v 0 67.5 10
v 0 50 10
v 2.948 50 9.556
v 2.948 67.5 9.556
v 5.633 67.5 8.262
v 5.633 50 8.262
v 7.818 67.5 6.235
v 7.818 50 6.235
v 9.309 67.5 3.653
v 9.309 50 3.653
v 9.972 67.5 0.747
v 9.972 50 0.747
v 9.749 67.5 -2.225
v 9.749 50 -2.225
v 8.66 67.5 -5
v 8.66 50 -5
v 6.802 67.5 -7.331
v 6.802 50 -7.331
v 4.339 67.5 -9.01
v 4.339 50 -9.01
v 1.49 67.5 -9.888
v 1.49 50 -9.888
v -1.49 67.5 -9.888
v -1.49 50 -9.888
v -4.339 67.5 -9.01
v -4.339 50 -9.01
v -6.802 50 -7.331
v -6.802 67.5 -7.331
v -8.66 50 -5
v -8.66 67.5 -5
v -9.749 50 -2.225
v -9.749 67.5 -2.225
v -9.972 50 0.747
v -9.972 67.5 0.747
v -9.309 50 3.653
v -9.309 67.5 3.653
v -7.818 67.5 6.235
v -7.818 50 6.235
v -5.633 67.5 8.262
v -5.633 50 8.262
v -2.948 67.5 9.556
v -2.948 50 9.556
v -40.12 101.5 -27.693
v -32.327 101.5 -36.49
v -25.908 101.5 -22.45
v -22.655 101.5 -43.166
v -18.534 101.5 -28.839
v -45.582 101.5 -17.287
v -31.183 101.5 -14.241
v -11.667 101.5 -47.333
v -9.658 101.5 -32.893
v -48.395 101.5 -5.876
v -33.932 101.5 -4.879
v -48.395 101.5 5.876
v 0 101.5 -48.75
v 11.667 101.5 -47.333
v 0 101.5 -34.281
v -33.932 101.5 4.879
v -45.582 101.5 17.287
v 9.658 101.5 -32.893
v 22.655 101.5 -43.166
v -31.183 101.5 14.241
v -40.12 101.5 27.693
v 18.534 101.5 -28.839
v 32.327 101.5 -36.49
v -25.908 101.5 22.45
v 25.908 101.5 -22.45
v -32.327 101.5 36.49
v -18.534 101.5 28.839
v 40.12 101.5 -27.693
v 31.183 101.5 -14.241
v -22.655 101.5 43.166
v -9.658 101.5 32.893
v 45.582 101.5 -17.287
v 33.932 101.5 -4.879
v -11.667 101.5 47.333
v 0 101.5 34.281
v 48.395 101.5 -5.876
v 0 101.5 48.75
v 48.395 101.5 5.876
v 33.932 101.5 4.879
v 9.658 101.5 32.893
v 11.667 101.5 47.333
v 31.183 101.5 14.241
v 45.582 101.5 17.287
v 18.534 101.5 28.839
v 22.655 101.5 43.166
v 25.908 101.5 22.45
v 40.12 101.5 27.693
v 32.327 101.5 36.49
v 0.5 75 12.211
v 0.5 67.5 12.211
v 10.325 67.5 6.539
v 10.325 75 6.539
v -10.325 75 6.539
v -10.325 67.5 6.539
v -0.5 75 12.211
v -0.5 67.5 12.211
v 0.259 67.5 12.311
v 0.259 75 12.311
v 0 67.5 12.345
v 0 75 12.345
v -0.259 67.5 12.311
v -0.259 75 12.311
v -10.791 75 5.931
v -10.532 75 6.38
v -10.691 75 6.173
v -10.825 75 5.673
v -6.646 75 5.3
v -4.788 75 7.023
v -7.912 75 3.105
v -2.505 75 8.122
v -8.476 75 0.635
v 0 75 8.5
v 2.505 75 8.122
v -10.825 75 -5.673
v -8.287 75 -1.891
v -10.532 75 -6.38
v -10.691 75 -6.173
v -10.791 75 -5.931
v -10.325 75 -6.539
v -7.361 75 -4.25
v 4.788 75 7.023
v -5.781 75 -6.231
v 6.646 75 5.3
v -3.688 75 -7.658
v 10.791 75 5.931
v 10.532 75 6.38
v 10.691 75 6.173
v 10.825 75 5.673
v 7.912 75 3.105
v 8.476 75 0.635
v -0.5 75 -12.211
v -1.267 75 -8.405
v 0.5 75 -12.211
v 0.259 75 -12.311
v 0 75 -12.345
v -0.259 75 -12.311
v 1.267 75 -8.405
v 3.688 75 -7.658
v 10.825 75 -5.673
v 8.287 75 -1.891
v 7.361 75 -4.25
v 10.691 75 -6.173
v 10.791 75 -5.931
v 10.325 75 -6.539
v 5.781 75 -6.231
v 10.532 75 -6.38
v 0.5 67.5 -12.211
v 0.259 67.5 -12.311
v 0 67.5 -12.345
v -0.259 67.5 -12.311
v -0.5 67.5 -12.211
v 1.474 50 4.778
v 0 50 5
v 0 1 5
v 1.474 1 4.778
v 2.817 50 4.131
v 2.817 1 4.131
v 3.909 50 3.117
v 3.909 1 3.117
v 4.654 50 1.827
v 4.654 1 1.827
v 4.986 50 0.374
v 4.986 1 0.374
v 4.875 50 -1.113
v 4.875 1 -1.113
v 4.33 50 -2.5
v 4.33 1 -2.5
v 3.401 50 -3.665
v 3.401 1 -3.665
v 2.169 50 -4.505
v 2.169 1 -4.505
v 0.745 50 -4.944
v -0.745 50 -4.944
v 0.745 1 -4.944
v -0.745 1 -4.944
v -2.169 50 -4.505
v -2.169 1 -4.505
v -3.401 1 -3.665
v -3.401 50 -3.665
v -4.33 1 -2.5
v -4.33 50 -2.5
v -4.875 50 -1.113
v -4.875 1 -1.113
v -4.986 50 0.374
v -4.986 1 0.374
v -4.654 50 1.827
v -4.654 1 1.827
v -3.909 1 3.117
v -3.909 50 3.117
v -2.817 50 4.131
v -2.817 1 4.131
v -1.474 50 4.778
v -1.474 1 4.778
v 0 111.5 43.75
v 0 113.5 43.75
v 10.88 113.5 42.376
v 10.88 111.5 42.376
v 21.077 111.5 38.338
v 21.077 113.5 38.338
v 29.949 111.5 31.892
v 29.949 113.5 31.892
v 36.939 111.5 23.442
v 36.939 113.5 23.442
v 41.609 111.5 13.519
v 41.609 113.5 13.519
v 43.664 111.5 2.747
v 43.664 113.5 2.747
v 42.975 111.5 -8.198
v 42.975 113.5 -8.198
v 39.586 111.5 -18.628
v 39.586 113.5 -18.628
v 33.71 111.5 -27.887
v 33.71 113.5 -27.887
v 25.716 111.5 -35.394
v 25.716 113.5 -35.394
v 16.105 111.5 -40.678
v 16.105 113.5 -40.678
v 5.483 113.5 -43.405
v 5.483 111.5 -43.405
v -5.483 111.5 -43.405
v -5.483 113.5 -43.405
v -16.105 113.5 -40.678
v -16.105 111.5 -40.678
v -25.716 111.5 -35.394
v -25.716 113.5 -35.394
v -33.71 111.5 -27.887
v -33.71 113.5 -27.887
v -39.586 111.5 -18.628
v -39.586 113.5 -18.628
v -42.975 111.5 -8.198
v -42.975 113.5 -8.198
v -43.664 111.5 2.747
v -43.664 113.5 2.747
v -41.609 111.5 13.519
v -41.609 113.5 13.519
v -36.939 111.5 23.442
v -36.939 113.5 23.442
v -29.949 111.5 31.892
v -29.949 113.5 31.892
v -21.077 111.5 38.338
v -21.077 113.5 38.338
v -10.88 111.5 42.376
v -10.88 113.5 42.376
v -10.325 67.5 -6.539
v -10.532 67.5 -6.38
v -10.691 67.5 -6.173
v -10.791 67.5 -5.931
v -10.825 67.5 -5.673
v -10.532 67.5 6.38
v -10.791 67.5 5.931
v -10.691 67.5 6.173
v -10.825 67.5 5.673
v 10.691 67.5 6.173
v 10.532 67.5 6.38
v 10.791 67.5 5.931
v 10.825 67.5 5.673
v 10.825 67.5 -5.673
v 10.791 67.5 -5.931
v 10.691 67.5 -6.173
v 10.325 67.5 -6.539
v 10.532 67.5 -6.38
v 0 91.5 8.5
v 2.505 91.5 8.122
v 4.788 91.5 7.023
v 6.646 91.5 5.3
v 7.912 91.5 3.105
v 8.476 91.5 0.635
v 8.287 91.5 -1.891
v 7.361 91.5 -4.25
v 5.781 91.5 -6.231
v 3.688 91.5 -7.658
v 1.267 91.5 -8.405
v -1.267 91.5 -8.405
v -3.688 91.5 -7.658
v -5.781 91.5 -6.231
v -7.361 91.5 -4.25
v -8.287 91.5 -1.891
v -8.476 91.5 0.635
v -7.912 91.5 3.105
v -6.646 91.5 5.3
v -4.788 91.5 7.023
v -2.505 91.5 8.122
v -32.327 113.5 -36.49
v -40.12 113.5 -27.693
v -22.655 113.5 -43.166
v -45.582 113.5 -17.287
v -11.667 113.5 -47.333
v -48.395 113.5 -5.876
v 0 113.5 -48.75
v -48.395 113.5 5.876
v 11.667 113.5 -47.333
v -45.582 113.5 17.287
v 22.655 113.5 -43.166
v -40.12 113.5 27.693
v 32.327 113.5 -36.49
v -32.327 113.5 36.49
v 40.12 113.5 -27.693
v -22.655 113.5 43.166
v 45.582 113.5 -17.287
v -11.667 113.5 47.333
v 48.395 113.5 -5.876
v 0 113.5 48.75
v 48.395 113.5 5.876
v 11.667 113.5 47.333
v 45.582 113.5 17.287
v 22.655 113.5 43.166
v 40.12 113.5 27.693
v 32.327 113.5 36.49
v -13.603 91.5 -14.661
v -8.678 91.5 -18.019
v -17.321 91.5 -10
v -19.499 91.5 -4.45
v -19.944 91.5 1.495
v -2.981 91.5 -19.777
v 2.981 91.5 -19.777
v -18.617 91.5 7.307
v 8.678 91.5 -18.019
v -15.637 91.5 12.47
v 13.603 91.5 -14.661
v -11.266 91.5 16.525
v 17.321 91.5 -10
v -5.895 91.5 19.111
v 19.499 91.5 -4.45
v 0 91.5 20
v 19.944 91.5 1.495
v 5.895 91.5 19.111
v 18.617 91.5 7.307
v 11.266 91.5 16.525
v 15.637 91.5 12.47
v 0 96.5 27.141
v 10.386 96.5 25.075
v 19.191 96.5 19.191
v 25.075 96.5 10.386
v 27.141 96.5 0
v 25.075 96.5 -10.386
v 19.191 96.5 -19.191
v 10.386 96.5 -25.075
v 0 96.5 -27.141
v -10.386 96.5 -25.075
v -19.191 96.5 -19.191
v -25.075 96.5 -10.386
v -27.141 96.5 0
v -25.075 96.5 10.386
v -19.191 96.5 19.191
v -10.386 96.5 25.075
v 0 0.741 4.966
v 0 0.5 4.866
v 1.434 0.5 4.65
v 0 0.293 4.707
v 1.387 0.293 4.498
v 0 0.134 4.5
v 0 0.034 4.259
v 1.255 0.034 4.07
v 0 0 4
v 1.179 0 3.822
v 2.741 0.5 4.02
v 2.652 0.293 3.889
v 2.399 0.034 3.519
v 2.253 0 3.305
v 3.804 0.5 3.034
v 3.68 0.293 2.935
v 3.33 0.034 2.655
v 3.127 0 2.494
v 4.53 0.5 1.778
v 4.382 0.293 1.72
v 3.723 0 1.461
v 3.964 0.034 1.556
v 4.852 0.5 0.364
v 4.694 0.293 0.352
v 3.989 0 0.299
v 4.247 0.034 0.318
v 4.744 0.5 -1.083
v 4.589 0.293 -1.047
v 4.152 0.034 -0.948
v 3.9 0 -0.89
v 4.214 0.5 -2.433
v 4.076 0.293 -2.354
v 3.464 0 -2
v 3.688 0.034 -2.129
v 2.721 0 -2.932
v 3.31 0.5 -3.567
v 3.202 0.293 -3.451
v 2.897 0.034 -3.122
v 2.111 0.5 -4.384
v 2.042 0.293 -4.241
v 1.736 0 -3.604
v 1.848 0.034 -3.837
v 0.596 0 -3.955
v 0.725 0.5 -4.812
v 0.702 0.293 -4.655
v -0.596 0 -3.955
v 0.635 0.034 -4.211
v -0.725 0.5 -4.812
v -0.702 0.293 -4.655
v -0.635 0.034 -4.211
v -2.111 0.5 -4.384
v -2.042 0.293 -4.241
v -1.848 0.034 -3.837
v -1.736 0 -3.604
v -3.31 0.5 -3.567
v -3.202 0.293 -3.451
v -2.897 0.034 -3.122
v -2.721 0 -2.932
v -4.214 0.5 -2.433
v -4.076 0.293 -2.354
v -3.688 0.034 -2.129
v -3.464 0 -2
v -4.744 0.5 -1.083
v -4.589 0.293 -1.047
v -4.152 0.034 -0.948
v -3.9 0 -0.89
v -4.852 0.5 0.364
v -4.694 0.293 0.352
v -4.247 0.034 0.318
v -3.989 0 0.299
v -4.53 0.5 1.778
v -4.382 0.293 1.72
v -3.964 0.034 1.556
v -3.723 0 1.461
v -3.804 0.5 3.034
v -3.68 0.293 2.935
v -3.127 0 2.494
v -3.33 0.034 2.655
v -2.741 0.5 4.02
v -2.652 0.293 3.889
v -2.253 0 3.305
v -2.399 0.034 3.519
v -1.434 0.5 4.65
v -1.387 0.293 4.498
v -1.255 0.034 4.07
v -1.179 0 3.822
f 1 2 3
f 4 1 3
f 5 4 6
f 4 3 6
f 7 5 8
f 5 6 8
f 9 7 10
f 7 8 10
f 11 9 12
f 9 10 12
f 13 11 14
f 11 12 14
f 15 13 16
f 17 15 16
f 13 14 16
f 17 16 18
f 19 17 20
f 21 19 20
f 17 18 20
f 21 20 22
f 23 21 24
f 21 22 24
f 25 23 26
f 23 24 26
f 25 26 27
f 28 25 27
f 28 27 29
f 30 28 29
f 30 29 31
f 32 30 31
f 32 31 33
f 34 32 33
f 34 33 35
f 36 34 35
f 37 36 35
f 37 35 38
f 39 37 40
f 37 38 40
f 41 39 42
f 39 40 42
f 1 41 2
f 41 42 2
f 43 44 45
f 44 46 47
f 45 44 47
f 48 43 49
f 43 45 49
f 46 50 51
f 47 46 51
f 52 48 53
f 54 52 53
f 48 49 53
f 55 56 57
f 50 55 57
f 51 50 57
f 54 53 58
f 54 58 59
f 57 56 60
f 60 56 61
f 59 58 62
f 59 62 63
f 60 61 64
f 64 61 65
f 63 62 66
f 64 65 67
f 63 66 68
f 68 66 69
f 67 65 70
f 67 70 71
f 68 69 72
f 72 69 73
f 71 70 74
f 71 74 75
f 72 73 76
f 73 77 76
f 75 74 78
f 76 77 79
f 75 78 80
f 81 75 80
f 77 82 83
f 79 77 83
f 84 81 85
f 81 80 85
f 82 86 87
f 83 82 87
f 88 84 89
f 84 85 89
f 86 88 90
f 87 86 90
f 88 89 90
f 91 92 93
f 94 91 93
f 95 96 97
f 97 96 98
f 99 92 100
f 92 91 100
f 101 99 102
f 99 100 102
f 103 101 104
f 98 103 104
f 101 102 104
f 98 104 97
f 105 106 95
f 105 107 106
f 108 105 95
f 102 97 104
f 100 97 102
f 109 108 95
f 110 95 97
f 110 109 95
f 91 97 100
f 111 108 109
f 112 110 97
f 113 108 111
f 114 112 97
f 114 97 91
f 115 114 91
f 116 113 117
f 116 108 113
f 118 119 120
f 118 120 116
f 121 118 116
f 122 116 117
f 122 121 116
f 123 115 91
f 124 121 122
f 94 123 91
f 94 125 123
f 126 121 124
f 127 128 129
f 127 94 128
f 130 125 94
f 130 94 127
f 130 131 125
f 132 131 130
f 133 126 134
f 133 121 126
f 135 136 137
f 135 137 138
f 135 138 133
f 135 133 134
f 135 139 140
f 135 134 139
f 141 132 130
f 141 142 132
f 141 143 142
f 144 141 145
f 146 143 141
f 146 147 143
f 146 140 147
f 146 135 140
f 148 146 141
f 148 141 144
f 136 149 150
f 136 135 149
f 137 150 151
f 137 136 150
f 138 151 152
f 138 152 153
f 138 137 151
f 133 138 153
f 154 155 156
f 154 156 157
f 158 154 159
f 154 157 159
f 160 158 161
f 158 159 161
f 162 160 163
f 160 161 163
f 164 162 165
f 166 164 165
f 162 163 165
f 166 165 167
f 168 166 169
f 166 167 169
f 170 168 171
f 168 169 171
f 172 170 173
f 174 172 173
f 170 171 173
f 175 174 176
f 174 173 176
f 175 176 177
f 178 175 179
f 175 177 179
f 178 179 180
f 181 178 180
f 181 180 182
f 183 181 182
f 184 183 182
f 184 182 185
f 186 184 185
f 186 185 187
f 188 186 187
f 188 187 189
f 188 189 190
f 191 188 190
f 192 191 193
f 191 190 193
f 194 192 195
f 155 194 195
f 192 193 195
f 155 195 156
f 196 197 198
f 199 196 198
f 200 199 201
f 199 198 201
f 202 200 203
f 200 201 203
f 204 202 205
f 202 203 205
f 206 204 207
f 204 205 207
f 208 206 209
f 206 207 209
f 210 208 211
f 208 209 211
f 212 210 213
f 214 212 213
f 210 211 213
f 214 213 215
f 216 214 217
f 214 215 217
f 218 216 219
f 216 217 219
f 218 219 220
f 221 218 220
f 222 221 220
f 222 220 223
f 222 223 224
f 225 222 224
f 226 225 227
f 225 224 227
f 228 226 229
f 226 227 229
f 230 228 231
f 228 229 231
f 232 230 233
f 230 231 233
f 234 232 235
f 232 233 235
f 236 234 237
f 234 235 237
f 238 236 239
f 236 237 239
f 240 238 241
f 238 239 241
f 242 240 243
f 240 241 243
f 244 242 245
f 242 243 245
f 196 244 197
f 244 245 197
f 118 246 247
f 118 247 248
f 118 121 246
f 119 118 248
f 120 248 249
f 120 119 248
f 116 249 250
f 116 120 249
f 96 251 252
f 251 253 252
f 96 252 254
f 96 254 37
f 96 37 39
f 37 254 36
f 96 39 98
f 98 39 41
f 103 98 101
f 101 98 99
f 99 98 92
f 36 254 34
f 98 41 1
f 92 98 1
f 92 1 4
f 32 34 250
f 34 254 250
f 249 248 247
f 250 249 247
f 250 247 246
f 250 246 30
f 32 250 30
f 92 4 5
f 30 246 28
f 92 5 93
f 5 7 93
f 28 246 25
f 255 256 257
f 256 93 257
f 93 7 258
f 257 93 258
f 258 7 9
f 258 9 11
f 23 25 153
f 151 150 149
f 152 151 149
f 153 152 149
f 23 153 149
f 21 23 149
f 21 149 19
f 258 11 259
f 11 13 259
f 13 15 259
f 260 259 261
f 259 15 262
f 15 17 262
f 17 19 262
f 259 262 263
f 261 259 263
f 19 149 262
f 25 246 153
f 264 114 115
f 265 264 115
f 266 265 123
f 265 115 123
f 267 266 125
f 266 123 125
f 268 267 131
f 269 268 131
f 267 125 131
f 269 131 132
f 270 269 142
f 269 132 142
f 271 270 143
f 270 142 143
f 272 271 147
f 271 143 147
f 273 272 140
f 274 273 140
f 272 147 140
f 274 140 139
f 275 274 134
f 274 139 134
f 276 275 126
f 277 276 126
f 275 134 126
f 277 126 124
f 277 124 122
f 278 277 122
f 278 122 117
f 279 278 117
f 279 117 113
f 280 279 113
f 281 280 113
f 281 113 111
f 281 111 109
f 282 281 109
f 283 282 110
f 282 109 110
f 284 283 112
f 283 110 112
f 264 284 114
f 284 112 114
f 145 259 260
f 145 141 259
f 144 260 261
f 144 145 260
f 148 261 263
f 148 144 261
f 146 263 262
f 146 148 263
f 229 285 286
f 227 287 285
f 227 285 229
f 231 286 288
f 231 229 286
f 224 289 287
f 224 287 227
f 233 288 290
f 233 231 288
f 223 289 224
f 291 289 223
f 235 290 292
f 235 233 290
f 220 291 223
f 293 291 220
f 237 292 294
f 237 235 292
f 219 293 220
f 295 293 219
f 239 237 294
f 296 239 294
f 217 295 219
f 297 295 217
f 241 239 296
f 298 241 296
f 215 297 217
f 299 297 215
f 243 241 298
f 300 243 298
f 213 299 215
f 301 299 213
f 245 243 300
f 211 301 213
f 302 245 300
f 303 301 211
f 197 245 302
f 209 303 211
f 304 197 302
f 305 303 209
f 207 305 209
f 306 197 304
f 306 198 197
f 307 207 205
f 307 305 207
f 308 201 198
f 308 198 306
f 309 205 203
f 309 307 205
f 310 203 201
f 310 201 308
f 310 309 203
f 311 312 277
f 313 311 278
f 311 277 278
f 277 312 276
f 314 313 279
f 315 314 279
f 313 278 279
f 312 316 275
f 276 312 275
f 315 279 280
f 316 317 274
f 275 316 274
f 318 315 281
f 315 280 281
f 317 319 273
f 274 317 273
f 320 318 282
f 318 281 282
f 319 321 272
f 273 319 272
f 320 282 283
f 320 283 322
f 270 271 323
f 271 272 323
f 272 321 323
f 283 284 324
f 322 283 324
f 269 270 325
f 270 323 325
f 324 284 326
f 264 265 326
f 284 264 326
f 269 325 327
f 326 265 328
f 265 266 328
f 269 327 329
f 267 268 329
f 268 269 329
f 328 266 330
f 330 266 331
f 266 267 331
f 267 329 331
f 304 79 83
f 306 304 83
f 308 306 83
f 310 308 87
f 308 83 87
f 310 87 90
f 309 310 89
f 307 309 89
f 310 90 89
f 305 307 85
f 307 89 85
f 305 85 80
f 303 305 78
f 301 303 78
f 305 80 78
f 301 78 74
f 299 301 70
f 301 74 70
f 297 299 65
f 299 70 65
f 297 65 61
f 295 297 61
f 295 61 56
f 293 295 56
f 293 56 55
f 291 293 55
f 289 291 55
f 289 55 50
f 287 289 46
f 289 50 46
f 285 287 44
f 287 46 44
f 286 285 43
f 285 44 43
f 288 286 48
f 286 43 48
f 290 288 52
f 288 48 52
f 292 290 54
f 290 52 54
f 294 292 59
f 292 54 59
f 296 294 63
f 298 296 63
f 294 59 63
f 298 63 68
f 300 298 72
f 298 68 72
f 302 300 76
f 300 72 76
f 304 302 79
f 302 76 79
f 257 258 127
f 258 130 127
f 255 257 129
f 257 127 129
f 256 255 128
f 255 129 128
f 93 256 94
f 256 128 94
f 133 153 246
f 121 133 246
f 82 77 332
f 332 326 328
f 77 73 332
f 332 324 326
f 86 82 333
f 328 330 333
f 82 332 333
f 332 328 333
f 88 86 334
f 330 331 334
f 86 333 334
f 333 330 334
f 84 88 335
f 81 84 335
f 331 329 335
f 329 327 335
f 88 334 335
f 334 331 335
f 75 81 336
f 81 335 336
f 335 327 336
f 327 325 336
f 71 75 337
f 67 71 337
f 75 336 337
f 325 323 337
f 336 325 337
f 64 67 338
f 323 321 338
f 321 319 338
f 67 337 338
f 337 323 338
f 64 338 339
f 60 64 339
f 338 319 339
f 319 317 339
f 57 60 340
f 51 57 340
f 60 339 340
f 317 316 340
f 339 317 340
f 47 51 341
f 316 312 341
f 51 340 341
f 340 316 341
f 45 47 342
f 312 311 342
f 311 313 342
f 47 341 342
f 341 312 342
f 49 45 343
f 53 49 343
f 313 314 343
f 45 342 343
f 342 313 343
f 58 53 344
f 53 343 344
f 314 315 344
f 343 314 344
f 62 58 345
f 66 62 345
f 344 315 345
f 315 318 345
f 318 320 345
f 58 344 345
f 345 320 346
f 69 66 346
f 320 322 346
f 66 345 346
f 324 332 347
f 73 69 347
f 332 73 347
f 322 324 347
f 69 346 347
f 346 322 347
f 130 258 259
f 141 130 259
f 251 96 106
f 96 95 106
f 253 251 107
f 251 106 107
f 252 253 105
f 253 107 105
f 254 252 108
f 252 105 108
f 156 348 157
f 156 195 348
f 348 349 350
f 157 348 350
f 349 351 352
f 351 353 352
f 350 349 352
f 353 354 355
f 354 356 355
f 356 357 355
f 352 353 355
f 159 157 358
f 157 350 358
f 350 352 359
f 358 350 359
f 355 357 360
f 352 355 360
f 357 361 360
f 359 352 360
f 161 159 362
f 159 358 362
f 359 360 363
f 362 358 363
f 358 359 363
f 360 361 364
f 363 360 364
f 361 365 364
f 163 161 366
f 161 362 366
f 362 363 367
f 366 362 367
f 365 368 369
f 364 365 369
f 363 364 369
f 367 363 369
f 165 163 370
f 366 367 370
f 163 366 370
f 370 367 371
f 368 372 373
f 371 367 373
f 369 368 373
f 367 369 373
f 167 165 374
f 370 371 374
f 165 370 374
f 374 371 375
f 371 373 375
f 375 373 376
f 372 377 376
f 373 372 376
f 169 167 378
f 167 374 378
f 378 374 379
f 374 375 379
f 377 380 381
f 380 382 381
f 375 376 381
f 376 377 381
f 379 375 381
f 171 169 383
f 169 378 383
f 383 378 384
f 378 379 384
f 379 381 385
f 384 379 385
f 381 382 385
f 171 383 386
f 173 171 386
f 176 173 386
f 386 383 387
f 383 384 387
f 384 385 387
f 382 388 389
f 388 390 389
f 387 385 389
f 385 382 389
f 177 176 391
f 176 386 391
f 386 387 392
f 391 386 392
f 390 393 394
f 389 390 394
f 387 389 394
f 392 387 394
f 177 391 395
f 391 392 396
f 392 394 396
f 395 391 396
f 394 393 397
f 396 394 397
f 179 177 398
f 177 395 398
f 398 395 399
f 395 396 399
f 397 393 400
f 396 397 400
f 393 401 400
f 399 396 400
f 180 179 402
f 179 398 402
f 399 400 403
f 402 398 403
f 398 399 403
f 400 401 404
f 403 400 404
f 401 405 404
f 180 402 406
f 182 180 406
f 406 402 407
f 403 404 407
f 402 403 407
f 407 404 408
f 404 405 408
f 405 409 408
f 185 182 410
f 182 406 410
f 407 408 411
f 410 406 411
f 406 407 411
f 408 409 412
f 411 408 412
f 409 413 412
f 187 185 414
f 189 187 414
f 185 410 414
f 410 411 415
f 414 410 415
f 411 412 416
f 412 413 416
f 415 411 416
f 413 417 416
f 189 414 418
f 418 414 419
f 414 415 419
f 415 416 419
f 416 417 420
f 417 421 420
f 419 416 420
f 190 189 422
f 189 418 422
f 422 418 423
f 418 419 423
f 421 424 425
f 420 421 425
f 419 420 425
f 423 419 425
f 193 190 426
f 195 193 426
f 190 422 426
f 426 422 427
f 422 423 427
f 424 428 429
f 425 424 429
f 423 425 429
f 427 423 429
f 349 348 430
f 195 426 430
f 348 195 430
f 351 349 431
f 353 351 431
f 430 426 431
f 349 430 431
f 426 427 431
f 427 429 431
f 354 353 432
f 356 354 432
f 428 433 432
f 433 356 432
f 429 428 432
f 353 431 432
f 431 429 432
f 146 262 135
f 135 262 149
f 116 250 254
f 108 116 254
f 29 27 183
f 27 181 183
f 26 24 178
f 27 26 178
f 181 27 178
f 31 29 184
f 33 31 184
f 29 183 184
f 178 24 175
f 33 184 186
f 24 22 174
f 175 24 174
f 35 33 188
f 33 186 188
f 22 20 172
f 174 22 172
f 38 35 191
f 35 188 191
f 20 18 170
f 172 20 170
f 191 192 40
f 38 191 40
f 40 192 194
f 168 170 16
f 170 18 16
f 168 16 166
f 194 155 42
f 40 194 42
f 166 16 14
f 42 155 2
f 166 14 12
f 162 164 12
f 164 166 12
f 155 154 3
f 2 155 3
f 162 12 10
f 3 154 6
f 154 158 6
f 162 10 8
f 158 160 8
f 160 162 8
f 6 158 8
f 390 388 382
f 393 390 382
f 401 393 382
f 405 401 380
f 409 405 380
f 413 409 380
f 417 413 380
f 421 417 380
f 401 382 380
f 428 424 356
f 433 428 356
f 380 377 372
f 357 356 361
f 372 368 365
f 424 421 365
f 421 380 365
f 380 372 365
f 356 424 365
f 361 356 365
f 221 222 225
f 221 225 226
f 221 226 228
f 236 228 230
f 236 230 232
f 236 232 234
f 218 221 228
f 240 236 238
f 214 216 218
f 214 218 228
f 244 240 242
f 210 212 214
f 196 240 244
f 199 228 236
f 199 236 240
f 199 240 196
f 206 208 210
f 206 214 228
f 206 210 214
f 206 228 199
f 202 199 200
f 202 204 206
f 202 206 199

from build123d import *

# Parameters (mm, degrees)
SKETCH1_R           = 5
BOSS_EXTRUDE1_DEPTH = 50
SKETCH2_R           = 10
BOSS_EXTRUDE2_DEPTH = 17.5
BOSS_EXTRUDE3_DEPTH = 7.5
SKETCH4_R           = 8.5
BOSS_EXTRUDE4_DEPTH = 16.5
SKETCH5_R           = 20
BOSS_EXTRUDE5_DEPTH = 10
SKETCH6_R           = 48.75
BOSS_EXTRUDE6_DEPTH = 12
CHAMFER1_SIZE2      = 10
CHAMFER1_SIZE       = 14.281480067
SKETCH7_R           = 43.75
CUT_EXTRUDE2_DEPTH  = 2
FILLET1_R           = 1


with BuildPart() as part:
    # Sketch1 → Boss-Extrude1 (new body)
    with BuildSketch(Plane(origin=(0, 0, 0), x_dir=(1, 0, 0), z_dir=(0, 1, 0))):
        with Locations(Location((0, 0, 0), (0, 0, 270))):
            Circle(SKETCH1_R)
    extrude(amount=BOSS_EXTRUDE1_DEPTH)

    # Sketch2 → Boss-Extrude2 (add)
    with BuildSketch(Plane(origin=(0, 50, 0), x_dir=(1, 0, 0), z_dir=(0, 1, 0))):
        with Locations(Location((0, 0, 0), (0, 0, 270))):
            Circle(SKETCH2_R)
    extrude(amount=BOSS_EXTRUDE2_DEPTH)

    # Sketch3 → Boss-Extrude3 (add)
    with BuildSketch(Plane(origin=(0, 67.5, 0), x_dir=(1, 0, 0), z_dir=(0, 1, 0))):
        Polygon((10.825317547, -6.25), (10.825317547, 6.25), (0, 12.5), (-10.825317547, 6.25), (-10.825317547, -6.25), (0, -12.5), align=None)
    extrude(amount=BOSS_EXTRUDE3_DEPTH)

    # Sketch4 → Boss-Extrude4 (add)
    with BuildSketch(Plane(origin=(0, 75, 0), x_dir=(1, 0, 0), z_dir=(0, 1, 0))):
        with Locations(Location((0, 0, 0), (0, 0, 270))):
            Circle(SKETCH4_R)
    extrude(amount=BOSS_EXTRUDE4_DEPTH)

    # Sketch5 → Boss-Extrude5 (add)
    with BuildSketch(Plane(origin=(0, 91.5, 0), x_dir=(1, 0, 0), z_dir=(0, 1, 0))):
        with Locations(Location((0, 0, 0), (0, 0, 270))):
            Circle(SKETCH5_R)
    extrude(amount=BOSS_EXTRUDE5_DEPTH)

    # Sketch6 → Boss-Extrude6 (add)
    with BuildSketch(Plane(origin=(0, 101.5, 0), x_dir=(1, 0, 0), z_dir=(0, 1, 0))):
        with Locations(Location((0, 0, 0), (0, 0, 270))):
            Circle(SKETCH6_R)
    extrude(amount=BOSS_EXTRUDE6_DEPTH)

    # Chamfer1
    chamfer1_edges = [part.edges().sort_by_distance(p)[0] for p in [
        (0, 101.5, -20),
    ]]
    chamfer1_side = [part.faces().sort_by_distance(p)[0] for p in [
        (0, 101.5, -20.2),
    ]]
    chamfer(chamfer1_edges, length=CHAMFER1_SIZE - 0.0001, length2=CHAMFER1_SIZE2 - 0.0001, reference=chamfer1_side[0])  # a hair under: the kernel refuses the full size

    # Sketch7 → Cut-Extrude2 (cut)
    with BuildSketch(Plane(origin=(0, 113.5, 0), x_dir=(1, 0, 0), z_dir=(0, 1, 0))):
        with Locations(Location((0, 0, 0), (0, 0, 270))):
            Circle(SKETCH7_R)
    extrude(amount=-CUT_EXTRUDE2_DEPTH, mode=Mode.SUBTRACT)

    # Fillet1
    fillet1_edges = [part.edges().sort_by_distance(p)[0] for p in [
        (0, 71.25, 12.5),
        (10.825317547, 71.25, 6.25),
        (10.825317547, 71.25, -6.25),
        (0, 71.25, -12.5),
        (-10.825317547, 71.25, -6.25),
        (-10.825317547, 71.25, 6.25),
        (0, 0, -5),
    ]]
    fillet(fillet1_edges, radius=FILLET1_R)


solid = part.part
